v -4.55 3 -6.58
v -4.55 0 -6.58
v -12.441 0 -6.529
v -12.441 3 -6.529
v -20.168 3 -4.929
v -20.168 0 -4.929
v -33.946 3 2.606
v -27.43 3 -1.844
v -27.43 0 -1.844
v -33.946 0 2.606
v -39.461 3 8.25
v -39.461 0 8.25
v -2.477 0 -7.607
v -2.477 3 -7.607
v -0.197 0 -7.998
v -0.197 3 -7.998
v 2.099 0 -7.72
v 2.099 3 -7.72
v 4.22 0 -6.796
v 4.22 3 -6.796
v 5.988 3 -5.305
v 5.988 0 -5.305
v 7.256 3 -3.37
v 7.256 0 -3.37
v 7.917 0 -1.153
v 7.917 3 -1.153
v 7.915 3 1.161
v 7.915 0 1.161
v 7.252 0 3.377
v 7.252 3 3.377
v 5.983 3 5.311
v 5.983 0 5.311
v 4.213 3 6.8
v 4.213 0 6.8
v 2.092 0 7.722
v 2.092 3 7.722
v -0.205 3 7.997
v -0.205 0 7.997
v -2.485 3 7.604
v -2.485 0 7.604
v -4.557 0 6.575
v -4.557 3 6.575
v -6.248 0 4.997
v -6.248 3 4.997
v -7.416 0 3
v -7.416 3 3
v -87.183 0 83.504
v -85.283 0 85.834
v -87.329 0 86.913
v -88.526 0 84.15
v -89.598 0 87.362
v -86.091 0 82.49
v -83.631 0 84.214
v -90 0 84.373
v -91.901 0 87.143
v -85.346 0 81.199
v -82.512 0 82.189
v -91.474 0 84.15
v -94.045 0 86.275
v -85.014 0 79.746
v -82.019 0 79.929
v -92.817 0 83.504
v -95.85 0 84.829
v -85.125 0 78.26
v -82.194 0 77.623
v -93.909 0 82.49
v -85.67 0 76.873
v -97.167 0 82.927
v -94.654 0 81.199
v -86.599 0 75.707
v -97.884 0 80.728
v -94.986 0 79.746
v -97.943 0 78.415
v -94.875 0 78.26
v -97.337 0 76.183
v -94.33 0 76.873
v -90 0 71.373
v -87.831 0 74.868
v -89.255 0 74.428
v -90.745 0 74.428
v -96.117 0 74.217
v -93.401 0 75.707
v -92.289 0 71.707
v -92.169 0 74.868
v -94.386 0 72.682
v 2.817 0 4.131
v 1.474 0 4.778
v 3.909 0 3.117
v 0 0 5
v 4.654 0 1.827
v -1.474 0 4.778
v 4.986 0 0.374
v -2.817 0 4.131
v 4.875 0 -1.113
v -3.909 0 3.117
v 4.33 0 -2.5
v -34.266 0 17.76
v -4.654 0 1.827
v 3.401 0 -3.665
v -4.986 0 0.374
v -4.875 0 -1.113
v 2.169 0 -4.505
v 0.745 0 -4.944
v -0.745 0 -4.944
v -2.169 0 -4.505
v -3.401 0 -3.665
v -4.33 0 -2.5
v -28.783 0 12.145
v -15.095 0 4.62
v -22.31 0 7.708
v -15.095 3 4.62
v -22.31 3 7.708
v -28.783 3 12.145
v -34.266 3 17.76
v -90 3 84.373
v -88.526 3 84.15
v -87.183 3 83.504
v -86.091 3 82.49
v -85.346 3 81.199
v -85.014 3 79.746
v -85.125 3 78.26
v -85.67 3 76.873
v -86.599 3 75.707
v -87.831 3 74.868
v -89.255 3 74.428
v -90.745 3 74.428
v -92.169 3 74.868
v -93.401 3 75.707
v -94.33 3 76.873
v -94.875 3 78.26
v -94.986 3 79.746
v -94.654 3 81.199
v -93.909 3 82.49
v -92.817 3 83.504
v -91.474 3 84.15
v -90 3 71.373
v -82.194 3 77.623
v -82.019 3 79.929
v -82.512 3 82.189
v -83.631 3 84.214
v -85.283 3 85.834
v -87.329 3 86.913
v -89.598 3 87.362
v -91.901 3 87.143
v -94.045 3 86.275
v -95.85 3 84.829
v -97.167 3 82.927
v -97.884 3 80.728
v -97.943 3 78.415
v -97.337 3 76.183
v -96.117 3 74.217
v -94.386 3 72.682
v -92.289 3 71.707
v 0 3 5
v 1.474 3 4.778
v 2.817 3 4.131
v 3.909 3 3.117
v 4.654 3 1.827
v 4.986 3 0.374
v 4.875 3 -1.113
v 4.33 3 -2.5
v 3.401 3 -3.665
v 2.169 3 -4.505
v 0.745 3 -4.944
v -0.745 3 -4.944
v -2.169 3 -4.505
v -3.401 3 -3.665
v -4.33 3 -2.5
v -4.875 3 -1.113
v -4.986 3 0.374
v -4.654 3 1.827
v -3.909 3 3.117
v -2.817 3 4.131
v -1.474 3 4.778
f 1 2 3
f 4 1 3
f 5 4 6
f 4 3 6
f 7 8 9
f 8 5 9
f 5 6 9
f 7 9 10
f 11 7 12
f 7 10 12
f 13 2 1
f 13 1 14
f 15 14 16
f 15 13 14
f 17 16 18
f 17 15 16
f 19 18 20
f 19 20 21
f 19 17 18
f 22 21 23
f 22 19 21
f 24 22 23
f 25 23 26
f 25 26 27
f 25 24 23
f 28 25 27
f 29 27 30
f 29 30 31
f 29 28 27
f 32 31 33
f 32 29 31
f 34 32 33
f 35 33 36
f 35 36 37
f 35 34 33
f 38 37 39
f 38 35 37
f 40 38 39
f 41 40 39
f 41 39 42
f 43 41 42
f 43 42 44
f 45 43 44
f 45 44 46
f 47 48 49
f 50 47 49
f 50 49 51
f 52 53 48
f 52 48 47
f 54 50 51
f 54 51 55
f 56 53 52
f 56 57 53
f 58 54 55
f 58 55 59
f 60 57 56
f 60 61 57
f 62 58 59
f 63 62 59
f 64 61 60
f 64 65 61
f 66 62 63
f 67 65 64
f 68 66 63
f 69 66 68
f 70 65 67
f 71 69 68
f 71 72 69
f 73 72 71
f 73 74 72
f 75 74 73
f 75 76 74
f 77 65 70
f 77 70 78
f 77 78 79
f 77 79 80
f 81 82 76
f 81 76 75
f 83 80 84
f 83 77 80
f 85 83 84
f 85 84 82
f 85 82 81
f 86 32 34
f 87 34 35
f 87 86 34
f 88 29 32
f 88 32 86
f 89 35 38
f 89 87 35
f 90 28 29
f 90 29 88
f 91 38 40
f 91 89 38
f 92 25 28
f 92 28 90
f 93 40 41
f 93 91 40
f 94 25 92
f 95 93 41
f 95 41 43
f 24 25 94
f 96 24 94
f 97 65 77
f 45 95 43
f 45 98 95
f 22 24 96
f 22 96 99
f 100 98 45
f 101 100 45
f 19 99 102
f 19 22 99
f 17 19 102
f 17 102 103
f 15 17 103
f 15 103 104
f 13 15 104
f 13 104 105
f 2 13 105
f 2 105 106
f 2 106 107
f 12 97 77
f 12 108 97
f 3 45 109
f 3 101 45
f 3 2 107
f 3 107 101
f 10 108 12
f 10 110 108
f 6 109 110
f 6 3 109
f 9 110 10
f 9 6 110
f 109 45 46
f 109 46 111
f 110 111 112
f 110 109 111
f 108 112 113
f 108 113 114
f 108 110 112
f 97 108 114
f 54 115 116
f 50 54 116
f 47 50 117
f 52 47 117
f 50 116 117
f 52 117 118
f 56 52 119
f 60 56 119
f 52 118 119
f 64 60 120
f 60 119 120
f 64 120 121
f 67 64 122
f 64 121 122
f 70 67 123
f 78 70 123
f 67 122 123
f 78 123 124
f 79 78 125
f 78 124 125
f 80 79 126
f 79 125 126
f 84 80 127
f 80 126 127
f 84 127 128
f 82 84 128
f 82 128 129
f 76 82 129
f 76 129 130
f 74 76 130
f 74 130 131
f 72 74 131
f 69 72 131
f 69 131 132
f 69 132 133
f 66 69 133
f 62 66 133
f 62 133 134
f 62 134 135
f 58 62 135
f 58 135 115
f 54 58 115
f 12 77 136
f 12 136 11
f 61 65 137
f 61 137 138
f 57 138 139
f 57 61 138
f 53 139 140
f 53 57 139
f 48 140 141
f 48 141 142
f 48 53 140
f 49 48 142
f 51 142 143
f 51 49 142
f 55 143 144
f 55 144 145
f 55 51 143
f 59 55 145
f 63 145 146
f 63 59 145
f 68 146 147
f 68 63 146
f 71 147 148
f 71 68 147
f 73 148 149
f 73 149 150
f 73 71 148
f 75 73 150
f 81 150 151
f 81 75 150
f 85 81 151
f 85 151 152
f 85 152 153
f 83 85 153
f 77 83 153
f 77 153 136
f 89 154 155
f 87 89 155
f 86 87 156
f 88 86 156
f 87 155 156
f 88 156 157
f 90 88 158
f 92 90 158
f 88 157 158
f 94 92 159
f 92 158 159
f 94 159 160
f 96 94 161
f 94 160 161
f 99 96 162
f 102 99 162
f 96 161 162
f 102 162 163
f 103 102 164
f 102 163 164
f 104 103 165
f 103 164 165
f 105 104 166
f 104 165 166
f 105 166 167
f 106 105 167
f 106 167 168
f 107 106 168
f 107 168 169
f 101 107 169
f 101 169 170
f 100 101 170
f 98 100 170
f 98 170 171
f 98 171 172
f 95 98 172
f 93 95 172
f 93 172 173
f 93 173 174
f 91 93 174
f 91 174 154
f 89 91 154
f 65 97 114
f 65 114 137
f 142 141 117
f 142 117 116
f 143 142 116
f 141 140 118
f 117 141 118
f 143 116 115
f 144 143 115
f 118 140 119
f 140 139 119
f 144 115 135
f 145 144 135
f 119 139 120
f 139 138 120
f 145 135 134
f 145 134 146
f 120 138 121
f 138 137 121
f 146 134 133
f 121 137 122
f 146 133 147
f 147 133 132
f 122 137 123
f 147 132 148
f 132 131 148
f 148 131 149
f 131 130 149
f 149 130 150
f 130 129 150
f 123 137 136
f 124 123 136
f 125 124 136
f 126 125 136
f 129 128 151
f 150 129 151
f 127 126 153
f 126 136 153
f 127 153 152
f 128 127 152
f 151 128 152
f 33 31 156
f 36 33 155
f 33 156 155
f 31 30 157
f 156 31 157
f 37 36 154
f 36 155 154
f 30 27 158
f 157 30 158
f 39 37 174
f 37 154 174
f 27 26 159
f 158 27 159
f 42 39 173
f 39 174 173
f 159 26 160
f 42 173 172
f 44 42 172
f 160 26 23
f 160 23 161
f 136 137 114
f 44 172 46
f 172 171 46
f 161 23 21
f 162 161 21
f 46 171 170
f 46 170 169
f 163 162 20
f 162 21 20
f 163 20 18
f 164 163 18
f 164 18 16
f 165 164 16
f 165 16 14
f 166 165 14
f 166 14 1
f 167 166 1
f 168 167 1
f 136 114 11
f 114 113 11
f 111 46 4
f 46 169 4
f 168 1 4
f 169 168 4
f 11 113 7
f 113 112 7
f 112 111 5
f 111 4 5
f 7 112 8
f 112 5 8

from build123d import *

# Parameters (mm, degrees)
EXTRUDE_1_DEPTH     = 3
FILLET_1_R          = 40
SKETCH_2_R          = 5
CUT_EXTRUDE_1_DEPTH = 5
SKETCH_3_R          = 5
CUT_EXTRUDE_2_DEPTH = 5


with BuildPart() as part:
    # 草图1 → 凸台-拉伸1 (new body)
    with BuildSketch(Plane(origin=(0, 0, 0), x_dir=(1, 0, 0), z_dir=(0, 1, 0))):
        with BuildLine():
            Line((-23.136391963, 12.14008034), (-4.550043431, 6.580053554))
            ThreePointArc((-4.550043431, 6.580053554), (7.664409986, -2.292775515), (-7.416012825, -3.000458929))
            Line((-7.416012825, -3.000458929), (-19.543612326, 0.627460668))
            Line((-19.543612326, 0.627460668), (-82.193752502, -77.622539332))
            ThreePointArc((-82.193752502, -77.622539332), (-95, -85.61753733), (-90, -71.372539332))
            Line((-90, -71.372539332), (-23.136391963, 12.14008034))
        make_face()
    extrude(amount=EXTRUDE_1_DEPTH)

    # 圆角1
    # the kernel refuses this fillet: 40 mm, written as the material it adds along each edge
    with BuildSketch(Plane(origin=(-19.543612326, 0, -0.627460668), x_dir=(0.9580512482944434, 0, 0.2865969393441921), z_dir=(0, 1, 0))) as fillet_1_piece_1:
        with BuildLine():
            CenterArc((28.245446023, -36.838167986), FILLET_1_R, 112.934019548, 45.038121995)
            Line((-8.834618101, -21.835873341), (-9.576219383, -21.535827448))
            Line((-9.576219383, -21.535827448), (-0.741601282, 0.300045893))
            Line((-0.741601282, 0.300045893), (0, 0.8))
            ThreePointArc((0, 0.8), (6.329306247, 0.8), (12.346875823, 0.73676336))
            Line((12.346875823, 0.73676336), (12.658612494, 0))
        make_face()
    extrude(amount=3)
    # the kernel refuses this fillet: 40 mm, written as the material it takes off along each edge
    with BuildSketch(Plane(origin=(-23.136391963, -65.299644029, -12.14008034), x_dir=(0.9580512482944434, 0, 0.2865969393441925), z_dir=(0, 1, 0))) as fillet_1_2_piece_1:
        with BuildLine():
            CenterArc((27.283619124, -39.215444523), FILLET_1_R, 101.366634115, 56.605507428)
            Line((-9.796444999, -24.213149878), (-10.538046282, -23.913103985))
            Line((-10.538046282, -23.913103985), (-0.741601282, 0.300045893))
            Line((-0.741601282, 0.300045893), (0, 0.8))
            ThreePointArc((0, 0.8), (9.700080536, 0.8), (19.24249191, 0.78430889))
            Line((19.24249191, 0.78430889), (19.400161071, 0))
        make_face()
    extrude(amount=133.599288058, mode=Mode.SUBTRACT)

    # 草图2 → 切除-拉伸1 (cut)
    with BuildSketch(Plane(origin=(0, 3, 0), x_dir=(1, 0, 0), z_dir=(0, 1, 0))):
        with Locations(Location((-90, -79.372539332, 0), (0, 0, 270))):
            Circle(SKETCH_2_R)
    extrude(amount=-CUT_EXTRUDE_1_DEPTH, mode=Mode.SUBTRACT)

    # 草图3 → 切除-拉伸2 (cut)
    with BuildSketch(Plane(origin=(0, 3, 0), x_dir=(1, 0, 0), z_dir=(0, 1, 0))):
        with Locations(Location((0, 0, 0), (0, 0, 270))):
            Circle(SKETCH_3_R)
    extrude(amount=-CUT_EXTRUDE_2_DEPTH, mode=Mode.SUBTRACT)


solid = part.part
